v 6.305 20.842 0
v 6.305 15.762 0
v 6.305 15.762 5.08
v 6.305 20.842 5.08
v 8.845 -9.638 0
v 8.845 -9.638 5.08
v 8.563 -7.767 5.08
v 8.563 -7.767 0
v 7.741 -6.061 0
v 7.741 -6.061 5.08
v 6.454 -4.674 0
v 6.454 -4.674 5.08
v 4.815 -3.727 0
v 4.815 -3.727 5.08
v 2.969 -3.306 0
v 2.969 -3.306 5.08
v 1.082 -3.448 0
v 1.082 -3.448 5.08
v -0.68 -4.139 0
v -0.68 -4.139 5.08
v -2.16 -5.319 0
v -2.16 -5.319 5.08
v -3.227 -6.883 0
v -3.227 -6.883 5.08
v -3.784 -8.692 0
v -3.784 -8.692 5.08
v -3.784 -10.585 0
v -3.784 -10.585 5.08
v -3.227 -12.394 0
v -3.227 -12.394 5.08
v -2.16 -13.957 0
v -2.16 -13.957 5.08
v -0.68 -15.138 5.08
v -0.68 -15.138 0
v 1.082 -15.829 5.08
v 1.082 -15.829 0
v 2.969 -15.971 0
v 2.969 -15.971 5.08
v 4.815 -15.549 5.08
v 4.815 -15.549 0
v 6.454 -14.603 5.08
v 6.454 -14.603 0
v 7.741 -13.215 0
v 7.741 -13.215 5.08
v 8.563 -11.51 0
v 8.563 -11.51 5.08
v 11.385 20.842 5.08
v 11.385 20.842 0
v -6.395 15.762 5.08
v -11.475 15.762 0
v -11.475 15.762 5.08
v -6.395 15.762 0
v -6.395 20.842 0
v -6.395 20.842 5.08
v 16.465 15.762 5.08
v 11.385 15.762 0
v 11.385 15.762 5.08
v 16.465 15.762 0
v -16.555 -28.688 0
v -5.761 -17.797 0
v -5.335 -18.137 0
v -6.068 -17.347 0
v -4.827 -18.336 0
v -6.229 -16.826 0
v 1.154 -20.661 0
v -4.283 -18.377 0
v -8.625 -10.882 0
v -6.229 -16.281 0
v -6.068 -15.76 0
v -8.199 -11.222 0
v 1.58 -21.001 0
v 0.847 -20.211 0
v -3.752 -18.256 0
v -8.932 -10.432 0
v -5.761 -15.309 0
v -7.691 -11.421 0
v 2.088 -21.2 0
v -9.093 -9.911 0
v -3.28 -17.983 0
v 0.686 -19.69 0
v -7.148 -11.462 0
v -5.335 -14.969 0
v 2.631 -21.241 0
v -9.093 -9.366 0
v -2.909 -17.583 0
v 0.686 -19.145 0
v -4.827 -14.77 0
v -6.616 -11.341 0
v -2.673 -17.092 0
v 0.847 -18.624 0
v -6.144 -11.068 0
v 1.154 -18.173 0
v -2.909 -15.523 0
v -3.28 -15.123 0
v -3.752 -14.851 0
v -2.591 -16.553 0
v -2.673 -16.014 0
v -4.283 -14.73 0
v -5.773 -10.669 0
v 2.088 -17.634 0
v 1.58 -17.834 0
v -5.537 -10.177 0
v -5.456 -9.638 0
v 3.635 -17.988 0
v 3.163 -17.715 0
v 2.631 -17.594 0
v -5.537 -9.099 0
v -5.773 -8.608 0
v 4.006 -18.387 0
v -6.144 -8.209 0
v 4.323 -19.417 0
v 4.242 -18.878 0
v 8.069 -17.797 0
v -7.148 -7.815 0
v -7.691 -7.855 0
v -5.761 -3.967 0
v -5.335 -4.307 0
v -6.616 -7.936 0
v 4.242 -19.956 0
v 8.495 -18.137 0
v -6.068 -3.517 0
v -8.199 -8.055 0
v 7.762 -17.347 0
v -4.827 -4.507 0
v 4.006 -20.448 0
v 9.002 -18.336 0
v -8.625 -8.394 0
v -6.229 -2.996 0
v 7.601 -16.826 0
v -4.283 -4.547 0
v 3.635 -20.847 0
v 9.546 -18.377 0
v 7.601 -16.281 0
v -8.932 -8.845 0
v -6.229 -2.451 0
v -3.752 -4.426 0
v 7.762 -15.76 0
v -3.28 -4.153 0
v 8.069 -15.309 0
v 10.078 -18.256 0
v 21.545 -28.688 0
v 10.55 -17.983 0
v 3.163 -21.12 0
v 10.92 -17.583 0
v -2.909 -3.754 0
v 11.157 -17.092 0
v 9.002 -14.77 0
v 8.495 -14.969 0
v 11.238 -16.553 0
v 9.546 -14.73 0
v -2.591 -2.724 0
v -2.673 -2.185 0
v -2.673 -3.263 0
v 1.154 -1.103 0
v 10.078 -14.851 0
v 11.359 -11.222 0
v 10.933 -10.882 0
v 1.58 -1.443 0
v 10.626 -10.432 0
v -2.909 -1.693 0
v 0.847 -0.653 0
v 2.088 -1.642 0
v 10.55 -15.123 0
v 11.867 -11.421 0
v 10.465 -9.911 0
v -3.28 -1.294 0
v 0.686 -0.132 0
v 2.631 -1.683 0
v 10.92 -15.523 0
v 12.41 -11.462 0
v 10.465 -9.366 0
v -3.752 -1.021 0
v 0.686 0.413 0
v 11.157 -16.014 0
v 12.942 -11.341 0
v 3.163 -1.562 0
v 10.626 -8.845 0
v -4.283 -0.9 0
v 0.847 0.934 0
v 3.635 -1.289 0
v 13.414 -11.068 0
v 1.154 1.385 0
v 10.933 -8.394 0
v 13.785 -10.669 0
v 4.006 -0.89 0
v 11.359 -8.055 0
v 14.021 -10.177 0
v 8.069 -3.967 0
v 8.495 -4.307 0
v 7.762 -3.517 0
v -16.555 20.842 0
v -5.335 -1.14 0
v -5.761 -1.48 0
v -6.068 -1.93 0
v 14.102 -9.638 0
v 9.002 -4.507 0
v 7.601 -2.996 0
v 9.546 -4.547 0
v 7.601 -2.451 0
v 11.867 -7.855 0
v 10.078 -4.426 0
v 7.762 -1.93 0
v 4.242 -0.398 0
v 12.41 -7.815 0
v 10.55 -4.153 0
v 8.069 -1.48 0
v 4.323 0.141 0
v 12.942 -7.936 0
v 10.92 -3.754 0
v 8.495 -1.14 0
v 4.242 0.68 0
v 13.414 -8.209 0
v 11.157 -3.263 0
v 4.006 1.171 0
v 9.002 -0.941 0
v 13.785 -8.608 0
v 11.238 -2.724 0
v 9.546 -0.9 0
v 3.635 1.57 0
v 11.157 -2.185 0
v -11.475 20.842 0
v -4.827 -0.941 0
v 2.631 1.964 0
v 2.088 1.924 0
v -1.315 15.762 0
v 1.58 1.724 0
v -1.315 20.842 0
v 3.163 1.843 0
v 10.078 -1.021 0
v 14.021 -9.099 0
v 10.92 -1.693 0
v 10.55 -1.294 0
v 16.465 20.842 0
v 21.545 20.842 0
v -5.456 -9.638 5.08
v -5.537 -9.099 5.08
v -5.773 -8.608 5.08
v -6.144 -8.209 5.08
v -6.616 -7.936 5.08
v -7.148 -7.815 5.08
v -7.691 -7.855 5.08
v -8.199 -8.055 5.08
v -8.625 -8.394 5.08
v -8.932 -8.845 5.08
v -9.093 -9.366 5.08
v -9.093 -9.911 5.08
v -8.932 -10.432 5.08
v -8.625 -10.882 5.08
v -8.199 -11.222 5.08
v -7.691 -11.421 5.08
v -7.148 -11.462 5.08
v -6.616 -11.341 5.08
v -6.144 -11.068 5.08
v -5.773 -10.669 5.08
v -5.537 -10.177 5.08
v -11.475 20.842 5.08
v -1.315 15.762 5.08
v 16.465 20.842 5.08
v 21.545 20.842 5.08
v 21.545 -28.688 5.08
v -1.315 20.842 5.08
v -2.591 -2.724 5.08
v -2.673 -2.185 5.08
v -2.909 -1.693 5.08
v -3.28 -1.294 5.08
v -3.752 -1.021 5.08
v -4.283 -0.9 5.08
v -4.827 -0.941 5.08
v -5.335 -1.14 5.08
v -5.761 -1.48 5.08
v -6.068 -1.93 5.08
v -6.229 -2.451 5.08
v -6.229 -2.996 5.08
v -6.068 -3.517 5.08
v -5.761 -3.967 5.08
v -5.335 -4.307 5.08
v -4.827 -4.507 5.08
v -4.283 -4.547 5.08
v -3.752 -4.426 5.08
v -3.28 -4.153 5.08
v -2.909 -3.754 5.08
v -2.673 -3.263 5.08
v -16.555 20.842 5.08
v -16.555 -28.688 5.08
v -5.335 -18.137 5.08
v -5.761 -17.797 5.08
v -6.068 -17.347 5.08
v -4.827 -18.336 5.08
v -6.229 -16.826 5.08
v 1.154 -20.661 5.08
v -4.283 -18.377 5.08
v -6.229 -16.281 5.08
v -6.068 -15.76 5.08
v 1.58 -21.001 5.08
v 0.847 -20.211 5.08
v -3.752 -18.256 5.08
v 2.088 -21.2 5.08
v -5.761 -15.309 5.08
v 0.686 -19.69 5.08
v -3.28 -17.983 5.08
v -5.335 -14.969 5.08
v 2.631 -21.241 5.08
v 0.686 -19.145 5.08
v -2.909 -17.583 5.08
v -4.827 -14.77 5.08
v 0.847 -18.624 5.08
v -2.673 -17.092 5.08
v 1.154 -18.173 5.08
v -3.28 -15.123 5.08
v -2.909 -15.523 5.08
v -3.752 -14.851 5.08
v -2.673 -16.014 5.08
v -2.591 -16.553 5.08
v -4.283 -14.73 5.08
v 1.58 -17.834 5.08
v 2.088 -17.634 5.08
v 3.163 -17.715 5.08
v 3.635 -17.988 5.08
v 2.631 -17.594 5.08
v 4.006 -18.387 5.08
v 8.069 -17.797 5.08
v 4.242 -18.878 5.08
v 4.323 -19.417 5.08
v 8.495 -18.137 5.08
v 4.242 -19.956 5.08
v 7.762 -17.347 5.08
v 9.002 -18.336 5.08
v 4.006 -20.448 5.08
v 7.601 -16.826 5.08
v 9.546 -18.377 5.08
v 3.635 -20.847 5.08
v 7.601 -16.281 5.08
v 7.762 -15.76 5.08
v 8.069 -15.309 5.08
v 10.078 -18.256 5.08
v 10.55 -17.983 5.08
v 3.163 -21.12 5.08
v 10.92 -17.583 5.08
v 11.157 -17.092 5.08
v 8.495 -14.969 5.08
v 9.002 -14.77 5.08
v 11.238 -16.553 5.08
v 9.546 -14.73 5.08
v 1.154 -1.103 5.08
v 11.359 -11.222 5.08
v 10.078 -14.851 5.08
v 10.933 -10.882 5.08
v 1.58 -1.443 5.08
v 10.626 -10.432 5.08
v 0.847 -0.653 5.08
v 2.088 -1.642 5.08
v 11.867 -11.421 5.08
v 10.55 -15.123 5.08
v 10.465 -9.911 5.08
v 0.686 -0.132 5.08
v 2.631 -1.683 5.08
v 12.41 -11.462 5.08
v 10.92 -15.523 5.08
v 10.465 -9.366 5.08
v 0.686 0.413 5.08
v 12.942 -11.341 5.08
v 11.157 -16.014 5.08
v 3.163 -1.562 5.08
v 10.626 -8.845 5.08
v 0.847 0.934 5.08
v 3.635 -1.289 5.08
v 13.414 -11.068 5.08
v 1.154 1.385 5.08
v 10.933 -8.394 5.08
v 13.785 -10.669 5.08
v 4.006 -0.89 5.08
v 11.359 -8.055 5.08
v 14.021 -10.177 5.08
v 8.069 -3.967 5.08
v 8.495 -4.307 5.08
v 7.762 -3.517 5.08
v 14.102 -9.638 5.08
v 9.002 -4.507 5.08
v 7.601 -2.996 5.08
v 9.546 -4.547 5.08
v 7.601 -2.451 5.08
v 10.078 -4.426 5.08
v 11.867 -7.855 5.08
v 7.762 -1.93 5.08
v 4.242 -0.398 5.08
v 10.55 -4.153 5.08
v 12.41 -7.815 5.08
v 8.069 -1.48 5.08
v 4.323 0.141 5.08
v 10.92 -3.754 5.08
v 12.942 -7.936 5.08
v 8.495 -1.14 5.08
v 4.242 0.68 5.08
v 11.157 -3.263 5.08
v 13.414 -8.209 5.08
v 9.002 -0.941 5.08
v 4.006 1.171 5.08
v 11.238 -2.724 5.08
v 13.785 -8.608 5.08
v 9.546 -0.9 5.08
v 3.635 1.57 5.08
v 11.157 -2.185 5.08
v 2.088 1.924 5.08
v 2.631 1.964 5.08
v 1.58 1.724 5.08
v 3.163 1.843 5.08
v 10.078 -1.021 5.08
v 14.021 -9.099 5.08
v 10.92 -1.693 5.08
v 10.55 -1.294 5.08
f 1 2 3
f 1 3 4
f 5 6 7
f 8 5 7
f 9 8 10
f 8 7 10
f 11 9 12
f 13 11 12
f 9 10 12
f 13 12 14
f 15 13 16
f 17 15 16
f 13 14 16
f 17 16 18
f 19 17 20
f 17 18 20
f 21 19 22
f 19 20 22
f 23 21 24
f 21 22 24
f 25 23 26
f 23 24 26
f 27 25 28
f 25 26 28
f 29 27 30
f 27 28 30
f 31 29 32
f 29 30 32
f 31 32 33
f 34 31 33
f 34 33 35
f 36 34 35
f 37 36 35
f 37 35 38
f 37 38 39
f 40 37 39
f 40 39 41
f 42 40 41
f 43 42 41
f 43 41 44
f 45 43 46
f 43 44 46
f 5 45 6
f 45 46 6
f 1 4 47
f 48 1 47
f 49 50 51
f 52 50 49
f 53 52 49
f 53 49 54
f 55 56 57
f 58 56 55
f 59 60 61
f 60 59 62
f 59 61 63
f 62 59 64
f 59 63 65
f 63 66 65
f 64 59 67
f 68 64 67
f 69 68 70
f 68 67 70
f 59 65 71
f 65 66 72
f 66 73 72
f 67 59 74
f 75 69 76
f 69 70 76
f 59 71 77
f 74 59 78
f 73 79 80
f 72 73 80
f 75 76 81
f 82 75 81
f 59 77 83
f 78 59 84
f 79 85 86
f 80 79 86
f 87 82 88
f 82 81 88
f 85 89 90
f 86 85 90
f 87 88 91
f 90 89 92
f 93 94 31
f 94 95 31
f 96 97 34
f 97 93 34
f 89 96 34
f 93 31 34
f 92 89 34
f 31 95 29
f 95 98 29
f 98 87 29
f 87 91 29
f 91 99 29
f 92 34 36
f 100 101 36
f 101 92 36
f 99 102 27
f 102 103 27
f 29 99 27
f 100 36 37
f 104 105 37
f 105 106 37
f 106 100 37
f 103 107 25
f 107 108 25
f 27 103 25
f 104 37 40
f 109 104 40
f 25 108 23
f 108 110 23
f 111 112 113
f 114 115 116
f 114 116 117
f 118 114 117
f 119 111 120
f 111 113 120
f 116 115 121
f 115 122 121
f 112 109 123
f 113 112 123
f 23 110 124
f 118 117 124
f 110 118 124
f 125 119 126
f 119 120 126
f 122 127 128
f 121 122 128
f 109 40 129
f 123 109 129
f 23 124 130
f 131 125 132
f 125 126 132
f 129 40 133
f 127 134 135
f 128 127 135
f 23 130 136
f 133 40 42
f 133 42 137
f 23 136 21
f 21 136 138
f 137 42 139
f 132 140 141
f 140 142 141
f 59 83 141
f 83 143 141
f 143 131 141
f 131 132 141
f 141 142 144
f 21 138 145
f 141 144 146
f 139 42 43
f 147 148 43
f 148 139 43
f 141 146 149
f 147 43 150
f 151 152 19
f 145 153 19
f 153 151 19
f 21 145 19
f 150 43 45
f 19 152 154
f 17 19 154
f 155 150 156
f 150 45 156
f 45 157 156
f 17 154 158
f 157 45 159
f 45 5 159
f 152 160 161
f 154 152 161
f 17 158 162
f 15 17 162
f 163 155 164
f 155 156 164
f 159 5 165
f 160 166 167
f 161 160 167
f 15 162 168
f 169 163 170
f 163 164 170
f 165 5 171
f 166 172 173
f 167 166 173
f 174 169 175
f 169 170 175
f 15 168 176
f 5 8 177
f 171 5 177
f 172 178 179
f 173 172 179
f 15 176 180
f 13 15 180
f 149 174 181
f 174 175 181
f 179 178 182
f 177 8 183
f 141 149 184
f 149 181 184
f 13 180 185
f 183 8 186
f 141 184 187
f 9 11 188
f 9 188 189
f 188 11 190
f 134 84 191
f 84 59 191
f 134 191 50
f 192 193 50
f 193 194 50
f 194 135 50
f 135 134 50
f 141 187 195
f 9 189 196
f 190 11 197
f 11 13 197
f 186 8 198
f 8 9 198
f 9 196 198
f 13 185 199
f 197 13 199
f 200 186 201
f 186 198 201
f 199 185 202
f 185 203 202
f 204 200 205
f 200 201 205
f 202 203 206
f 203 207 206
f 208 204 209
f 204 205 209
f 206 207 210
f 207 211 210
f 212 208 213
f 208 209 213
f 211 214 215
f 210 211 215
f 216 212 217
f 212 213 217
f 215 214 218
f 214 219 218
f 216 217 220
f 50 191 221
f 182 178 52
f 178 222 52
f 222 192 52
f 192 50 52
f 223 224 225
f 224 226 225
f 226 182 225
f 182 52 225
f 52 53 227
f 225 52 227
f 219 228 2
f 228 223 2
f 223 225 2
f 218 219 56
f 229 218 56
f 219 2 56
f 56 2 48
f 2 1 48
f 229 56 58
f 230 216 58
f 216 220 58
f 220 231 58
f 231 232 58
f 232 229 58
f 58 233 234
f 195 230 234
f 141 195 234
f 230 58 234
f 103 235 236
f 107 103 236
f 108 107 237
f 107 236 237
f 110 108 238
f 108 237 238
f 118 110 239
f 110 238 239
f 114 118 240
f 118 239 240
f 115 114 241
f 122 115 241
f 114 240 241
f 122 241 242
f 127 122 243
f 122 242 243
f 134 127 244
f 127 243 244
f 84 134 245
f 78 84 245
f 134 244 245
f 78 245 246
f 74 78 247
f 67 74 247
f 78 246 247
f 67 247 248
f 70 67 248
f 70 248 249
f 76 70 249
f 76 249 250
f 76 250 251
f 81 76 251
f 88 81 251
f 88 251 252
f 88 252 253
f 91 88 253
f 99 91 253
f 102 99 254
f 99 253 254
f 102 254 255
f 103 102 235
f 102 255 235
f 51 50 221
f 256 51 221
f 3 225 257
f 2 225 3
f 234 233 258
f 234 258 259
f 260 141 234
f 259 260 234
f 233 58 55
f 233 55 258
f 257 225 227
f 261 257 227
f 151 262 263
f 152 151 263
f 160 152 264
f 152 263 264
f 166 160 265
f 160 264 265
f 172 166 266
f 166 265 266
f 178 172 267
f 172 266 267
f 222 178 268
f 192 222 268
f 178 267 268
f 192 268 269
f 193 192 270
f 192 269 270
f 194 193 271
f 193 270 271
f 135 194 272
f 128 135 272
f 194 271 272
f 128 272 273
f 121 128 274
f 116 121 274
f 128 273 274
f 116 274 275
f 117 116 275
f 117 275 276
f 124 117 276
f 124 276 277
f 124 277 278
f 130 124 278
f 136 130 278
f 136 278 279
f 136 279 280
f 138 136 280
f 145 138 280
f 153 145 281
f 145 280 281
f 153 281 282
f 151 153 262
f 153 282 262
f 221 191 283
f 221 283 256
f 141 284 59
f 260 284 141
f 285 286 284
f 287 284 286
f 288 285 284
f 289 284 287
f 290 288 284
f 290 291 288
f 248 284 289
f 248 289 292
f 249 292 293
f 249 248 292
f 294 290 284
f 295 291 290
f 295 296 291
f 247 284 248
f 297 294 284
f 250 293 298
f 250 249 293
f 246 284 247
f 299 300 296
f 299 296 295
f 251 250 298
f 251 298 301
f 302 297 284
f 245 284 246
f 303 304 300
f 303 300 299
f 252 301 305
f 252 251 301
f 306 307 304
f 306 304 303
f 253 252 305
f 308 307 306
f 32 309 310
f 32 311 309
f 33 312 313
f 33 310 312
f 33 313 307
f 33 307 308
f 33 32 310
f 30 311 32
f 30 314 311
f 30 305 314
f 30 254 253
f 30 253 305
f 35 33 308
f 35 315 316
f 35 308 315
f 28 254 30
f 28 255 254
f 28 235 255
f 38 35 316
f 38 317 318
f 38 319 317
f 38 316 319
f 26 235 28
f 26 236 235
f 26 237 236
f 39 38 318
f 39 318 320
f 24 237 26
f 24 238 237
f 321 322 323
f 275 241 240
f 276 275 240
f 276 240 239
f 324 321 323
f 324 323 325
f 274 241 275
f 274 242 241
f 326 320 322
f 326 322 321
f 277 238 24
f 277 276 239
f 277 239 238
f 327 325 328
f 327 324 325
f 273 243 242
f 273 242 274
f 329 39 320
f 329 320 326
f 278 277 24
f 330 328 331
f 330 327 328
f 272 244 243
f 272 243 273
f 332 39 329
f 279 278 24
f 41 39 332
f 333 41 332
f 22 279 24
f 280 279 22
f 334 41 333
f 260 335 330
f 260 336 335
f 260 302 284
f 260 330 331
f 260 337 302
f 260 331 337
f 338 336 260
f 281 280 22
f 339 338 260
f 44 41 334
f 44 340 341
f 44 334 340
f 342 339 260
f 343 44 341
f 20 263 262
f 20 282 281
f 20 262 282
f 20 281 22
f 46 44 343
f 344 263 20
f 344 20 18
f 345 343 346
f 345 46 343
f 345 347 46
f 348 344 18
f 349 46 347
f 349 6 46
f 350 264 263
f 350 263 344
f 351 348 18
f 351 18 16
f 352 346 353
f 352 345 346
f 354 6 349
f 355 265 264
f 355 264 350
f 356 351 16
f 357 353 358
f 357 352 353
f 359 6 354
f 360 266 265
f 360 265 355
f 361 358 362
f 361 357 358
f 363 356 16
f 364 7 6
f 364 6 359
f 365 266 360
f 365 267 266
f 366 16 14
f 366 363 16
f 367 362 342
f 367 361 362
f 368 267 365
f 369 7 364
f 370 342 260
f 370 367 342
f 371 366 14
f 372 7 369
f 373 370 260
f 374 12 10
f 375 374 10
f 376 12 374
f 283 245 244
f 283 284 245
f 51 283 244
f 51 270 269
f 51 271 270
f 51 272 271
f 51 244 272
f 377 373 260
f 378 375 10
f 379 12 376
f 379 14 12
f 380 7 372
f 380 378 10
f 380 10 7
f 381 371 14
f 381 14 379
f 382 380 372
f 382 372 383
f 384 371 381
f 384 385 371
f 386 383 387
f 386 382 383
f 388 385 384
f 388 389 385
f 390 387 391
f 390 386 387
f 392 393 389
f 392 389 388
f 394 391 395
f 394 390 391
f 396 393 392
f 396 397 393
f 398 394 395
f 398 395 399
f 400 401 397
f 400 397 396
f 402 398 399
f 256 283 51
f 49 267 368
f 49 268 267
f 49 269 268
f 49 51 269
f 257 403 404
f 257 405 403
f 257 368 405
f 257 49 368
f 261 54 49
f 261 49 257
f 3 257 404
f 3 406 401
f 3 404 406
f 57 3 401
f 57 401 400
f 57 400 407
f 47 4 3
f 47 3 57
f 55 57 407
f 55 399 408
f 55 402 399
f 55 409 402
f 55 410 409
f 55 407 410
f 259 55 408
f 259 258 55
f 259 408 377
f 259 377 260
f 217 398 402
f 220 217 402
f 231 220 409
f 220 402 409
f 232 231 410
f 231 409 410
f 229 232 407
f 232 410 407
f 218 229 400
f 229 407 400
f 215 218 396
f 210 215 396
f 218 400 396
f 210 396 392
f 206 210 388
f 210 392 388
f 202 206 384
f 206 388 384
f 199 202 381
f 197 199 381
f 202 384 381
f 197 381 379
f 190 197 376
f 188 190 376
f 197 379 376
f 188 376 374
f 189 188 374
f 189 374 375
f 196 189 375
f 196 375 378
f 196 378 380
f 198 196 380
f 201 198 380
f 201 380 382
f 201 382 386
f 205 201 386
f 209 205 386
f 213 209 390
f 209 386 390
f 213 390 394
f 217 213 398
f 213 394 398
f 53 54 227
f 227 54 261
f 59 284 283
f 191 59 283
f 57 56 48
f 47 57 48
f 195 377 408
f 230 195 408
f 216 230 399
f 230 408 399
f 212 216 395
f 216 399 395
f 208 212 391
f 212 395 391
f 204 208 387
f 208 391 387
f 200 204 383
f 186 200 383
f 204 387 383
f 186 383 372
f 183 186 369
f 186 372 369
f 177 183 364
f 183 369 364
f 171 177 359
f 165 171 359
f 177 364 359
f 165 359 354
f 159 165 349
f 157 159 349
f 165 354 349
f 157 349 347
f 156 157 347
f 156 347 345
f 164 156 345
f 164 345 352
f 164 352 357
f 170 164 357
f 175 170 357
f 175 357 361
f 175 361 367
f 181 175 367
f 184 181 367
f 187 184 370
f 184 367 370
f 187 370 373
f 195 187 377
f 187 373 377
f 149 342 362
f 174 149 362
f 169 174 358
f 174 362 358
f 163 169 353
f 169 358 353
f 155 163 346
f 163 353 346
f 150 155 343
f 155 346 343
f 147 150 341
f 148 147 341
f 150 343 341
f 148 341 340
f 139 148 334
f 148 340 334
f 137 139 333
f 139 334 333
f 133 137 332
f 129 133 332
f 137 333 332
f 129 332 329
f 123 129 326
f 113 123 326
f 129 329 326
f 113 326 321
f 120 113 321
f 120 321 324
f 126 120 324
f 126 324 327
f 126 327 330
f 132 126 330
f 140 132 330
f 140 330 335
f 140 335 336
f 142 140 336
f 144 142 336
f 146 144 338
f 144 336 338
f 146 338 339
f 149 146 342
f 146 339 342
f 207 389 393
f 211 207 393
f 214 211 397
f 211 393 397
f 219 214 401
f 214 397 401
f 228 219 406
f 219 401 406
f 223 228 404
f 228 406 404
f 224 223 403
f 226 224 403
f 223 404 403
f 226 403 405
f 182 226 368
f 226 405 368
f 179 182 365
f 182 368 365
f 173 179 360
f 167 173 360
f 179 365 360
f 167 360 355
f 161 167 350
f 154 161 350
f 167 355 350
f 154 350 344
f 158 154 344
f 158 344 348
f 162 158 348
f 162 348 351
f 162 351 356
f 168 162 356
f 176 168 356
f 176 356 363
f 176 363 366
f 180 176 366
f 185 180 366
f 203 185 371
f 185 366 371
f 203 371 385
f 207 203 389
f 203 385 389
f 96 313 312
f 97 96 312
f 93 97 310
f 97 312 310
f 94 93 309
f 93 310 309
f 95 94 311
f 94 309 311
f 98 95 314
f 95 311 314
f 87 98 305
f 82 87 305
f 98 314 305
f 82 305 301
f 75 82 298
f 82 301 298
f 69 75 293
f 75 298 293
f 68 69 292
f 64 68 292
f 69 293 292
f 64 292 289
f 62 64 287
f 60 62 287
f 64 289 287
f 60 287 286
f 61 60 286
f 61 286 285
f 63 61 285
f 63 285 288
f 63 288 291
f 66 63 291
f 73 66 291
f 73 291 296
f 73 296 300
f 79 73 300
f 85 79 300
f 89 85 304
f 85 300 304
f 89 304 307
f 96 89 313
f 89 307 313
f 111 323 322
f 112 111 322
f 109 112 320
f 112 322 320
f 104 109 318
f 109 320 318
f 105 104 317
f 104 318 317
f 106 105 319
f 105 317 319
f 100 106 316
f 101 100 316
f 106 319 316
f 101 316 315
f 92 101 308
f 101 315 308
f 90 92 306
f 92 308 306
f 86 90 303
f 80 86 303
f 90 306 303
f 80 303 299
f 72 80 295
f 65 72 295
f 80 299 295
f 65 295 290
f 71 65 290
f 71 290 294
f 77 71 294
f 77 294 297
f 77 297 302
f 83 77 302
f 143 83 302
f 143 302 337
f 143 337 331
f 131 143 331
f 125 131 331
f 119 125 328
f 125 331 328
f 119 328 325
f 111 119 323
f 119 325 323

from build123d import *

# Parameters (mm, degrees)
SKETCH1_W           = 38.1
SKETCH1_H           = 50.8
BOSS_EXTRUDE1_DEPTH = 5.08
SKETCH2_R           = 6.35
SKETCH2_R_2         = 1.8288
CUT_EXTRUDE1_DEPTH  = 5.08
SKETCH3_W           = 5.08
SKETCH3_H           = 5.08
BOSS_EXTRUDE2_DEPTH = 5.08
SKETCH4_W           = 38.1
SKETCH4_H           = 5.08
CUT_EXTRUDE2_DEPTH  = 11.43


with BuildPart() as part:
    # Sketch1 → Boss-Extrude1 (new body)
    with BuildSketch(Plane.XY):
        with Locations((2.494642857, -9.638392857)):
            Rectangle(SKETCH1_W, SKETCH1_H)
    extrude(amount=BOSS_EXTRUDE1_DEPTH)

    # Sketch2 → Cut-Extrude1 (cut)
    with BuildSketch(Plane.XY.offset(5.08)):
        with Locations((2.494642857, -9.638392857)):
            Circle(SKETCH2_R)
        with Locations((12.273642857, -9.638392857)):
            Circle(SKETCH2_R_2)
        with Locations((9.40944007, -16.55319007)):
            Circle(SKETCH2_R_2)
        with Locations((2.494642857, -19.417392857)):
            Circle(SKETCH2_R_2)
        with Locations((-4.420154356, -16.55319007)):
            Circle(SKETCH2_R_2)
        with Locations((-7.284357143, -9.638392857)):
            Circle(SKETCH2_R_2)
        with Locations((-4.420154356, -2.723595644)):
            Circle(SKETCH2_R_2)
        with Locations((2.494642857, 0.140607143)):
            Circle(SKETCH2_R_2)
        with Locations((9.40944007, -2.723595644)):
            Circle(SKETCH2_R_2)
    extrude(amount=-CUT_EXTRUDE1_DEPTH, mode=Mode.SUBTRACT)

    # Sketch3 → Boss-Extrude2 (add)
    with BuildSketch(Plane.XY.offset(5.08)):
        with Locations((-14.015357143, 18.301607143)):
            Rectangle(SKETCH3_W, SKETCH3_H)
        with Locations((8.844642857, 18.301607143)):
            Rectangle(SKETCH3_W, SKETCH3_H)
        with Locations((19.004642857, 18.301607143)):
            Rectangle(SKETCH3_W, SKETCH3_H)
        with Locations((-3.855357143, 18.301607143)):
            Rectangle(SKETCH3_W, SKETCH3_H)
        with Locations((-3.855357143, -37.578392857)):
            Rectangle(SKETCH3_W, SKETCH3_H)
        with Locations((-14.015357143, -37.578392857)):
            Rectangle(SKETCH3_W, SKETCH3_H)
        with Locations((19.004642857, -37.578392857)):
            Rectangle(SKETCH3_W, SKETCH3_H)
        with Locations((8.844642857, -37.578392857)):
            Rectangle(SKETCH3_W, SKETCH3_H)
    extrude(amount=-BOSS_EXTRUDE2_DEPTH)

    # Sketch4 → Cut-Extrude2 (cut)
    with BuildSketch(Plane.XZ.offset(40.118392857)):
        with Locations((2.494642857, 2.54)):
            Rectangle(SKETCH4_W, SKETCH4_H)
    extrude(amount=-CUT_EXTRUDE2_DEPTH, mode=Mode.SUBTRACT)


solid = part.part
